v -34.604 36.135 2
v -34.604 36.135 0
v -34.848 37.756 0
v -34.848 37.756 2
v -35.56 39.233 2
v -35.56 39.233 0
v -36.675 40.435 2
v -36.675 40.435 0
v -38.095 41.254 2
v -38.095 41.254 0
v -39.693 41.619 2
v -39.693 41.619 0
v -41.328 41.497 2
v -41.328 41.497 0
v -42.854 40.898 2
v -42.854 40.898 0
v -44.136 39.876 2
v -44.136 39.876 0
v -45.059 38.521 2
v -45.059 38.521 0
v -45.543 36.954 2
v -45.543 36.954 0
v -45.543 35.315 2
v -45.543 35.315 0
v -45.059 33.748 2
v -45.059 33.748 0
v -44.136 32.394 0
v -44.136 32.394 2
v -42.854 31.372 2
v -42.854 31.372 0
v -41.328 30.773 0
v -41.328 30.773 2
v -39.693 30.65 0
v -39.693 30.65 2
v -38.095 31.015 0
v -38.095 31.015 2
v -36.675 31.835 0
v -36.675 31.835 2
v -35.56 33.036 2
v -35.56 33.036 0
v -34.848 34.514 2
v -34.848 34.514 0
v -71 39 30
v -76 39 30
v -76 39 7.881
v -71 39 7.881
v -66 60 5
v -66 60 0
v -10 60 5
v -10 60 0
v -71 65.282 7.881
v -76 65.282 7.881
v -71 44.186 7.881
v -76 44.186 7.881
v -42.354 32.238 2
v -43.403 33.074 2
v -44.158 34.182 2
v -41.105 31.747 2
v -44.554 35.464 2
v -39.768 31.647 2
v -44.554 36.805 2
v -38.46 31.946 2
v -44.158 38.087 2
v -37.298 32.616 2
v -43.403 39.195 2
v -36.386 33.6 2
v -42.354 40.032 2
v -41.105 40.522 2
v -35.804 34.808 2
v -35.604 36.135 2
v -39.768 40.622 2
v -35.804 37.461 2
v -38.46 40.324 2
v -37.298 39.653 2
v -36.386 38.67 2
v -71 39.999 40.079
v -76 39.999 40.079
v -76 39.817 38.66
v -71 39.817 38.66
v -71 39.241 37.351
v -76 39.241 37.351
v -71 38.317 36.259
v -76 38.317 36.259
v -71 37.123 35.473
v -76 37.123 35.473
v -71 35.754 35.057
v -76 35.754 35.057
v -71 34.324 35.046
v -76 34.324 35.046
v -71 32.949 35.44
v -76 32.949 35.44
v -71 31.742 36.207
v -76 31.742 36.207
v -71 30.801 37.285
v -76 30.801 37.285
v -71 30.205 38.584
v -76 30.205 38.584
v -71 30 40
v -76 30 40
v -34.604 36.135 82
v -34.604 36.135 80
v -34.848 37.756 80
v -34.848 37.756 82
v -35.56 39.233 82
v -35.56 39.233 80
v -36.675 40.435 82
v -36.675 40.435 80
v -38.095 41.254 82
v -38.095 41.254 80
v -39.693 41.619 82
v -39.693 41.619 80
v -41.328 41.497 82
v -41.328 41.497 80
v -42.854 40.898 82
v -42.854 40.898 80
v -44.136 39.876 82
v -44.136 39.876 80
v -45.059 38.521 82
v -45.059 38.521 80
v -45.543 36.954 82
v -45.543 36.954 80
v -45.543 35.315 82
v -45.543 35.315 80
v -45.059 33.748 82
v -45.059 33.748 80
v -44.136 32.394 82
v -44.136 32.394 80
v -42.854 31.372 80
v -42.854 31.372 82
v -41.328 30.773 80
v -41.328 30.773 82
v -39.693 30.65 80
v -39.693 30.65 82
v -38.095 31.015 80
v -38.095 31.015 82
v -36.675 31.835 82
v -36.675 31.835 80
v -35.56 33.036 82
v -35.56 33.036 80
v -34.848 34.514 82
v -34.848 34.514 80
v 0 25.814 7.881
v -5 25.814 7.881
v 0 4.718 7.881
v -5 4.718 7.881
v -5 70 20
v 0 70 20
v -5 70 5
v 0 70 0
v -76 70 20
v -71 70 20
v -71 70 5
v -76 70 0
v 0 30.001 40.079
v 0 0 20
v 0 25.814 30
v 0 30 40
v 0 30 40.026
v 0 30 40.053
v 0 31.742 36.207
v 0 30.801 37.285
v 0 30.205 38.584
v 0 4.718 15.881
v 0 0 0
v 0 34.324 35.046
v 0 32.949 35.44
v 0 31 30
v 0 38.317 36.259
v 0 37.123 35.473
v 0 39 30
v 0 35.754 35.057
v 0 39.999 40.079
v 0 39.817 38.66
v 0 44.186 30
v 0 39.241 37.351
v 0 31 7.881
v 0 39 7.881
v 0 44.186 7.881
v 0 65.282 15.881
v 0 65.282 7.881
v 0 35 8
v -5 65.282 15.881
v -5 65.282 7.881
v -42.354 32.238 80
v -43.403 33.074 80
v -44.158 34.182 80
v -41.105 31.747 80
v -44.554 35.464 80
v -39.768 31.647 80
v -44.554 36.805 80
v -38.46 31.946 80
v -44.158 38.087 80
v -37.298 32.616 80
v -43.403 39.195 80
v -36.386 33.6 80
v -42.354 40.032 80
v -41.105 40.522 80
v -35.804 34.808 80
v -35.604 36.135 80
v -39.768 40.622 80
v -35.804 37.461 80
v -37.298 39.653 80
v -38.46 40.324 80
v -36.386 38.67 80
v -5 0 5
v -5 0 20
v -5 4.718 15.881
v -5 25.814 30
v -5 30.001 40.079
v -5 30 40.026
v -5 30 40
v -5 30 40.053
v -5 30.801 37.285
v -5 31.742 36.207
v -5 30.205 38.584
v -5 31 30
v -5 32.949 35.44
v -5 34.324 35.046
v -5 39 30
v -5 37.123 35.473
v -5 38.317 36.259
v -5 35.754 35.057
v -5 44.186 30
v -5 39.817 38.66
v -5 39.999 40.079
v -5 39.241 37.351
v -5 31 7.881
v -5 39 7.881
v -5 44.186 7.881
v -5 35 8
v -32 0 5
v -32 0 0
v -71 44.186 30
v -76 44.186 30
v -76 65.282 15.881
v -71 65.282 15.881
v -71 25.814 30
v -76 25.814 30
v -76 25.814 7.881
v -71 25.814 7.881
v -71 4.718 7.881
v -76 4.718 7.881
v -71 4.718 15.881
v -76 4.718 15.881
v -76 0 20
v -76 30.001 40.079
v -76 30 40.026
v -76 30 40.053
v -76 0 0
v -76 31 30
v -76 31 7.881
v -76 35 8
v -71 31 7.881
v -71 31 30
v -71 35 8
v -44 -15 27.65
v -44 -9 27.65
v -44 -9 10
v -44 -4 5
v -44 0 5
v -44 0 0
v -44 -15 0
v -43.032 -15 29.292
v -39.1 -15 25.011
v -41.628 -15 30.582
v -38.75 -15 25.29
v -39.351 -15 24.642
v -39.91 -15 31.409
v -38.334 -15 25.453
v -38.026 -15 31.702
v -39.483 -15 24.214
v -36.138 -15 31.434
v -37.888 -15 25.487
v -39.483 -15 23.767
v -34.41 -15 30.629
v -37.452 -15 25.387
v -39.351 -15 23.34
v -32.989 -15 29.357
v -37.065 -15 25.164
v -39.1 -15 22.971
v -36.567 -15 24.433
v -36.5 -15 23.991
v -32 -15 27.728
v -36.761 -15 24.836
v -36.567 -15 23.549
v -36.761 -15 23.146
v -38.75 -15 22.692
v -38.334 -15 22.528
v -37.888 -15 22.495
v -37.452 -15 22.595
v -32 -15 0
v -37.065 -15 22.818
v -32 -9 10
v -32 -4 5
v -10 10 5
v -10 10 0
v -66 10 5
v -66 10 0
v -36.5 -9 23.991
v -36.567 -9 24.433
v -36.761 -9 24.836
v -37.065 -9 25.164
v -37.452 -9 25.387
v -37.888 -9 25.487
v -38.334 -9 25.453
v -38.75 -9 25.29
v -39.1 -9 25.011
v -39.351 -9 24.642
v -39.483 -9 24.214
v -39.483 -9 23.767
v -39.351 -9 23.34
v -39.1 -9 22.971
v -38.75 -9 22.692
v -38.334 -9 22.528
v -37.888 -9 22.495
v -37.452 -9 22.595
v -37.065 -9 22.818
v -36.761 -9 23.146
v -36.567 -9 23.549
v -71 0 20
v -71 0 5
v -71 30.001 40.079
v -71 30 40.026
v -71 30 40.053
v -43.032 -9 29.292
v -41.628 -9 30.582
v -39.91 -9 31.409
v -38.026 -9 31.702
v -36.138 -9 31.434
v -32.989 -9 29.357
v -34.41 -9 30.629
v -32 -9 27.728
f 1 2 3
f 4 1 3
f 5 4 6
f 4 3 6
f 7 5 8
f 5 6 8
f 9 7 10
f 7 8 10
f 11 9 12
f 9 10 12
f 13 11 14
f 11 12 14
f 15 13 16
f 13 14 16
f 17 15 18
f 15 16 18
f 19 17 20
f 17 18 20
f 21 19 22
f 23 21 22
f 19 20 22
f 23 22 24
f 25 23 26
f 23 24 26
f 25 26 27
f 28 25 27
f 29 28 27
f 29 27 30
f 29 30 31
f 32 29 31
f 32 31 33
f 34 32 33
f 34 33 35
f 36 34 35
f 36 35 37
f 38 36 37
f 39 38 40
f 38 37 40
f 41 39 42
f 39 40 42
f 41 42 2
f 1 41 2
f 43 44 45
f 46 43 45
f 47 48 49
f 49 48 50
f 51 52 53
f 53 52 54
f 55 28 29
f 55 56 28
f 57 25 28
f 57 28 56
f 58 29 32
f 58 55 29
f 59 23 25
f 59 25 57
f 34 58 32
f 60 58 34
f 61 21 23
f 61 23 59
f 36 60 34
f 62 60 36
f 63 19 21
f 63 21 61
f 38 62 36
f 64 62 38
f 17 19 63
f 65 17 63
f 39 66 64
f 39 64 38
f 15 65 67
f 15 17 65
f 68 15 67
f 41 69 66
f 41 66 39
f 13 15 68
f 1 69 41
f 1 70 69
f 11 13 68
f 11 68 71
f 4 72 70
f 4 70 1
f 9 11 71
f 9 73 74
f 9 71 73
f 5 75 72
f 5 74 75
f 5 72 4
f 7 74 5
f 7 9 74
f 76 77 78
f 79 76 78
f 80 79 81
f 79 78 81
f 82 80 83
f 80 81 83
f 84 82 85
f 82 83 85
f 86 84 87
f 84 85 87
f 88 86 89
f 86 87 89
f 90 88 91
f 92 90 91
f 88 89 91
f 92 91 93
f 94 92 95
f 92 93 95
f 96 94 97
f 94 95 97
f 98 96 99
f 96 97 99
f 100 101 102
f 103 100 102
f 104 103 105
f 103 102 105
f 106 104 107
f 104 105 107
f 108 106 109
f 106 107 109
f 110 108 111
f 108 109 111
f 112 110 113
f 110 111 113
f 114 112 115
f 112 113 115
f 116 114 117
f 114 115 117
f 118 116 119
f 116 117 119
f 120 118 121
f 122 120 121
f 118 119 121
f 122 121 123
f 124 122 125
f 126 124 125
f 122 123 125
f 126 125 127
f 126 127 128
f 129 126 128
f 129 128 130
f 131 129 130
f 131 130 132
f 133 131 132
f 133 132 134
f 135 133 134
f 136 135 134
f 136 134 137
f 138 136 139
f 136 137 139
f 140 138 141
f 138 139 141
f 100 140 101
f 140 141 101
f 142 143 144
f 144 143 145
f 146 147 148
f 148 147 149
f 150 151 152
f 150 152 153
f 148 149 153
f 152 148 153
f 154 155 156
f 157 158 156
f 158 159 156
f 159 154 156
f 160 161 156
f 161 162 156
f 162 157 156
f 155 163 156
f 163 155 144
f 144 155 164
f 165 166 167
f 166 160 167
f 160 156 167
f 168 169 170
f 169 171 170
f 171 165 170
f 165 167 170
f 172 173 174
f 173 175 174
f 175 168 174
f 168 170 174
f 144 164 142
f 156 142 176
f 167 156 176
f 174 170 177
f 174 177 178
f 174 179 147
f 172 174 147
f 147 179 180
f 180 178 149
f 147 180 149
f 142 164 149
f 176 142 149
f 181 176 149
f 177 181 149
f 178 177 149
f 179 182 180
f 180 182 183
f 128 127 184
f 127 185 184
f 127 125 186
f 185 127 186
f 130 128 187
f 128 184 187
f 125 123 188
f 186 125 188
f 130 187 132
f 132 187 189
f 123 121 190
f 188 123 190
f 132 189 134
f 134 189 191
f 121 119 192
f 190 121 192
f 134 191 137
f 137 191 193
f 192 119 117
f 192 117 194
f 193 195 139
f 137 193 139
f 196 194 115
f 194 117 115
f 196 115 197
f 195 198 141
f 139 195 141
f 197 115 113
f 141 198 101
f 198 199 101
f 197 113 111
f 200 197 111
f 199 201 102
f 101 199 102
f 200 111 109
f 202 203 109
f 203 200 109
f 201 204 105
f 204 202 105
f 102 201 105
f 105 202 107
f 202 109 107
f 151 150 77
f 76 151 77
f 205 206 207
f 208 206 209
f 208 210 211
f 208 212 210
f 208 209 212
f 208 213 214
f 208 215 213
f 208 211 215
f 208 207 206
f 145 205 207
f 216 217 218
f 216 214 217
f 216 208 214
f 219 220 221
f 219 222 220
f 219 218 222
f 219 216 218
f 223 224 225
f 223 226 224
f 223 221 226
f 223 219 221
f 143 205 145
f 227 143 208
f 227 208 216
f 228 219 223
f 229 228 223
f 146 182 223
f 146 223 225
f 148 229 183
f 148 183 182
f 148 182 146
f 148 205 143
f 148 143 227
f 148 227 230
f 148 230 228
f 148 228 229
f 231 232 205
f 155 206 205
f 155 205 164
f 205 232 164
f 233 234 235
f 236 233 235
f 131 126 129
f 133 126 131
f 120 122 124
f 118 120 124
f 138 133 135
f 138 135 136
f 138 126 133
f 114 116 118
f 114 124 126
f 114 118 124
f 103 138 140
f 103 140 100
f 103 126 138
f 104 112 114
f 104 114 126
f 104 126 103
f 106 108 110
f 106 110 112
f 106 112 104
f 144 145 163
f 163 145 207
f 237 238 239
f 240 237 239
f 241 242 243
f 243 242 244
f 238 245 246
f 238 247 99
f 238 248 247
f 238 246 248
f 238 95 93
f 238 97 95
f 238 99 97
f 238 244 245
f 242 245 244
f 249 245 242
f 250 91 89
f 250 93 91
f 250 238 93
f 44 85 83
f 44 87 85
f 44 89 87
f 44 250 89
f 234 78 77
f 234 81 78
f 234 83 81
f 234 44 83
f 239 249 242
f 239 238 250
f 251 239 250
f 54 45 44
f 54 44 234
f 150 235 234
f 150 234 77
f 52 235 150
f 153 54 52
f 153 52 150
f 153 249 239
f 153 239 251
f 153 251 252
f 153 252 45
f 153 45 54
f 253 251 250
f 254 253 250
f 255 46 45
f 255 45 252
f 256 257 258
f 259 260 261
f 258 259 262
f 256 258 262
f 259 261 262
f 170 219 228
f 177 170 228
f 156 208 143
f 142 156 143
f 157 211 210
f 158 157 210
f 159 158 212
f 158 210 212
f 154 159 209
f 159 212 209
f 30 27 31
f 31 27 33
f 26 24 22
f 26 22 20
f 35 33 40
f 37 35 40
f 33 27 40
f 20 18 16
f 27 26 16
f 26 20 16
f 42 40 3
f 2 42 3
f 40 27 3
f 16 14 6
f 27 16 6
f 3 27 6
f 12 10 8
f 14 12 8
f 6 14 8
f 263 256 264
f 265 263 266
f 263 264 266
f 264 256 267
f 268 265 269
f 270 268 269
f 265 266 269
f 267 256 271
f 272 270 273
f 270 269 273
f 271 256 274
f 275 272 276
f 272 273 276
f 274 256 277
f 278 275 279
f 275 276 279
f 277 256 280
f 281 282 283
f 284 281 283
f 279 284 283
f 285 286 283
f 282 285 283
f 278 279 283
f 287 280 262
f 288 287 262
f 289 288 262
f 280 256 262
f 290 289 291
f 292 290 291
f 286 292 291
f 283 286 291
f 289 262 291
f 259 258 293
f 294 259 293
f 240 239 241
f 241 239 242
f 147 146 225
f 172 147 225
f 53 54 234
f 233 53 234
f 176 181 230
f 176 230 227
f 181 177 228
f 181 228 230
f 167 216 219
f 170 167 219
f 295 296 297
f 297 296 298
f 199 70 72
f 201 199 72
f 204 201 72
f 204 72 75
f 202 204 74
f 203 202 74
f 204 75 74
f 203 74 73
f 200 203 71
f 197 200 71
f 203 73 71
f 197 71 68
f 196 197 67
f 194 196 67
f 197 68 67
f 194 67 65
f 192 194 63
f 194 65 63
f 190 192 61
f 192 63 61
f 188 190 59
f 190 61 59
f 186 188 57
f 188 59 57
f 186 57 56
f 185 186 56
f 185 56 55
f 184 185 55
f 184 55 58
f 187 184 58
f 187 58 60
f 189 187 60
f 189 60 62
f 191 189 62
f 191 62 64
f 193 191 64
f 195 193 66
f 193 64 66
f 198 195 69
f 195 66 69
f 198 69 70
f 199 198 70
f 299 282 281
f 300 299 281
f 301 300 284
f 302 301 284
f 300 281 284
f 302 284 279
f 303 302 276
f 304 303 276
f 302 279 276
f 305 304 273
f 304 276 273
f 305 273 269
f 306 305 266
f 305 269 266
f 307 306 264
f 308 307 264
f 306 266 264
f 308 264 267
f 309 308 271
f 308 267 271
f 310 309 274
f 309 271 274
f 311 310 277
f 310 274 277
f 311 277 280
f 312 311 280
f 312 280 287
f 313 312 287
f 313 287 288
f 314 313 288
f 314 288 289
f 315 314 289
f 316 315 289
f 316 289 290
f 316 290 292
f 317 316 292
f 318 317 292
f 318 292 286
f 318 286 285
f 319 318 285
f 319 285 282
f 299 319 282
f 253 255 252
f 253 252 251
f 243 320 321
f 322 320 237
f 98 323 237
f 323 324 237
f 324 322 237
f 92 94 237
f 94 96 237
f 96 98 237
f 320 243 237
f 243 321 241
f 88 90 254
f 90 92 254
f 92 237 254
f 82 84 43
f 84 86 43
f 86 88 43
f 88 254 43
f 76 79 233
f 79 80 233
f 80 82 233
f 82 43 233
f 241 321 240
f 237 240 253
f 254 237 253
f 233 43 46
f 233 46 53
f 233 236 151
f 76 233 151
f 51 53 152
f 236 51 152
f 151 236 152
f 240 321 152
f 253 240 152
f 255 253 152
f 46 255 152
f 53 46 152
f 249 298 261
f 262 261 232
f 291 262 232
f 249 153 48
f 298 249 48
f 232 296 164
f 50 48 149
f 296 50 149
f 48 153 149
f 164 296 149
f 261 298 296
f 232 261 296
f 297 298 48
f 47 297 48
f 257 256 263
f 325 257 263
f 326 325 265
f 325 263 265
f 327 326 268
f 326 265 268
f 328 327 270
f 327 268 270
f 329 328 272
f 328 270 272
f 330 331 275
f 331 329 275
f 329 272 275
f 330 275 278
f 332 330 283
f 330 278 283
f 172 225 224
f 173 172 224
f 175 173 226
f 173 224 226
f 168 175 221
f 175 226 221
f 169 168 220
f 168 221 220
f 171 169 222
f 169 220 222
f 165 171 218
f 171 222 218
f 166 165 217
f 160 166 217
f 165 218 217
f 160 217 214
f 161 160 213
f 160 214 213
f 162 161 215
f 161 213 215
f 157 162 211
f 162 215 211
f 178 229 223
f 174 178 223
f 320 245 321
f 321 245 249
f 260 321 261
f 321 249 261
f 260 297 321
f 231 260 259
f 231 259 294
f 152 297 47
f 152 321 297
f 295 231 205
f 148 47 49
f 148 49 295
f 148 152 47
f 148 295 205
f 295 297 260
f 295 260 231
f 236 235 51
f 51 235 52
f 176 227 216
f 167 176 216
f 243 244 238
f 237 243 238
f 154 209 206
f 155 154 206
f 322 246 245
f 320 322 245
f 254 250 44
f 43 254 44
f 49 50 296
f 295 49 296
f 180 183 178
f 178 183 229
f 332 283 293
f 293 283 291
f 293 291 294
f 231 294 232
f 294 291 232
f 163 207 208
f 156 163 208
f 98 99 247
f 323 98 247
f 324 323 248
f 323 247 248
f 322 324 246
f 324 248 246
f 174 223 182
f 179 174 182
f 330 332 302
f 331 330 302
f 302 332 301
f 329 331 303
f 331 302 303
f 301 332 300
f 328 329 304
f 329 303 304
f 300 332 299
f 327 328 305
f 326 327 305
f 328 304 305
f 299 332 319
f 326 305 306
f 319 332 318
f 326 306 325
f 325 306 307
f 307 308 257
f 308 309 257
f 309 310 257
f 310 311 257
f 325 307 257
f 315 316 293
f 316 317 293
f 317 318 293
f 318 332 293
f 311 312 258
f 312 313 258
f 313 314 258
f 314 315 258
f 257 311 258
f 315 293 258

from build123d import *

# Parameters (mm, degrees)
F0_W      = 5
F0_H      = 70
F0_W_2    = 56
F0_H_2    = 10
F1_DEPTH  = 5
F2_DEPTH  = 35
F3_DEPTH  = 45
F5_DEPTH  = 76.001
F6_R      = 1.5
F7_DEPTH  = 85.001
F8_SIZE   = 5
F9_R      = 5.5
F10_DEPTH = 2
F11_R     = 4.5
F12_DEPTH = 78
F13_R     = 5.5
F14_DEPTH = 2


with BuildPart() as f1:
    # F0 (on Top) → F1 (new body)
    with BuildSketch(Plane.XY):
        with Locations((-2.5, 35)):
            Rectangle(F0_W, F0_H)
        Polygon((-10, 0), (-5, 0), (-5, 70), (-10, 70), (-10, 60), (-10, 10), align=None)
        Polygon((-32, 0), (-10, 0), (-10, 10), (-66, 10), (-66, 0), (-44, 0), (-38, 0), align=None)
        Polygon((-32, -9), (-32, 0), (-38, 0), (-44, 0), (-44, -9), align=None)
        with Locations((-38, 65)):
            Rectangle(F0_W_2, F0_H_2)
        Polygon((-32, -15), (-32, -9), (-44, -9), (-44, -15), (-38, -15), align=None)
        Polygon((-66, 0), (-66, 10), (-66, 60), (-66, 70), (-71, 70), (-71, 0), align=None)
        with Locations((-73.5, 35)):
            Rectangle(F0_W, F0_H)
    extrude(amount=F1_DEPTH)

    # F0 (on Top) → F2 (join)
    with BuildSketch(Plane.XY):
        Polygon((-32, -15), (-32, -9), (-44, -9), (-44, -15), (-38, -15), align=None)
    extrude(amount=F2_DEPTH)

    # F0 (on Top) → F3 (join)
    with BuildSketch(Plane.XY):
        with Locations((-73.5, 35)):
            Rectangle(F0_W, F0_H)
        with Locations((-2.5, 35)):
            Rectangle(F0_W, F0_H)
    extrude(amount=F3_DEPTH)

    # F4 (on face) → F5 (cut, through all)
    with BuildSketch(Plane(origin=(-76, 0, 0), x_dir=(0, -1, 0), z_dir=(-1, 0, 0))):
        with BuildLine():
            ThreePointArc((-39.9993787036, 40.0788199095), (-35.0394111791, 35.0001553265), (-30, 40))
            ThreePointArc((-30, 40), (-30.0001553265, 40.0394111791), (-30.0006212964, 40.0788199095))
            ThreePointArc((-30.0006212964, 40.0788199095), (-35, 45), (-39.9993787036, 40.0788199095))
        make_face()
        Polygon((-35, 30), (-39, 30), (-39, 7.8811858993), (-35, 8), align=None)
        Polygon((-31, 30), (-35, 30), (-35, 8), (-31, 7.8811858993), align=None)
        Polygon((-44.186412645, 7.8811858993), (-44.186412645, 30), (-65.2819350362, 15.8811858993), (-65.2819350362, 7.8811858993), align=None)
        Polygon((-4.7180649638, 15.8811858993), (-25.813587355, 30), (-25.813587355, 7.8811858993), (-4.7180649638, 7.8811858993), align=None)
        with BuildLine():
            ThreePointArc((-35, 45), (-31.4924438385, 43.5632919855), (-30.0006212964, 40.0788199095))
            Line((-30.0006212964, 40.0788199095), (0, 20))
            Line((0, 20), (0, 45))
            Line((0, 45), (-35, 45))
        make_face()
        with BuildLine():
            Line((-70, 20), (-39.9993787036, 40.0788199095))
            ThreePointArc((-39.9993787036, 40.0788199095), (-38.5075561615, 43.5632919855), (-35, 45))
            Line((-35, 45), (-70, 45))
            Line((-70, 45), (-70, 20))
        make_face()
    extrude(amount=-F5_DEPTH, mode=Mode.SUBTRACT)

    # F6 (on face) → F7 (cut, through all)
    with BuildSketch(Plane.XZ.offset(15)):
        with Locations((-38, 23.9908639342)):
            Circle(F6_R)
        with BuildLine():
            ThreePointArc((-44, 27.6496782899), (-38.0260330484, 31.7016328425), (-32, 27.7275238186))
            Line((-32, 27.7275238186), (-32, 35))
            Line((-32, 35), (-44, 35))
            Line((-44, 35), (-44, 27.6496782899))
        make_face()
    extrude(amount=-F7_DEPTH, mode=Mode.SUBTRACT)

    # F8
    f8_edges = [f1.edges().sort_by_distance(p)[0] for p in [
        (-38, -9, 5),
    ]]
    chamfer(f8_edges, length=F8_SIZE)


with BuildPart() as f10:
    # F9 (on Top) → F10 (new body)
    with BuildSketch(Plane.XY):
        with Locations((-40.1041135192, 36.1346639693)):
            Circle(F9_R)
    extrude(amount=F10_DEPTH)

    # F11 (on face) → F12 (join)
    with BuildSketch(Plane.XY.offset(2)):
        with Locations((-40.1041135192, 36.1346639693)):
            Circle(F11_R)
    extrude(amount=F12_DEPTH)

    # F13 (on face) → F14 (join)
    with BuildSketch(Plane.XY.offset(80)):
        with Locations((-40.1041135192, 36.1346639693)):
            Circle(F13_R)
    extrude(amount=F14_DEPTH)


solid = Compound([f1.part, f10.part])
